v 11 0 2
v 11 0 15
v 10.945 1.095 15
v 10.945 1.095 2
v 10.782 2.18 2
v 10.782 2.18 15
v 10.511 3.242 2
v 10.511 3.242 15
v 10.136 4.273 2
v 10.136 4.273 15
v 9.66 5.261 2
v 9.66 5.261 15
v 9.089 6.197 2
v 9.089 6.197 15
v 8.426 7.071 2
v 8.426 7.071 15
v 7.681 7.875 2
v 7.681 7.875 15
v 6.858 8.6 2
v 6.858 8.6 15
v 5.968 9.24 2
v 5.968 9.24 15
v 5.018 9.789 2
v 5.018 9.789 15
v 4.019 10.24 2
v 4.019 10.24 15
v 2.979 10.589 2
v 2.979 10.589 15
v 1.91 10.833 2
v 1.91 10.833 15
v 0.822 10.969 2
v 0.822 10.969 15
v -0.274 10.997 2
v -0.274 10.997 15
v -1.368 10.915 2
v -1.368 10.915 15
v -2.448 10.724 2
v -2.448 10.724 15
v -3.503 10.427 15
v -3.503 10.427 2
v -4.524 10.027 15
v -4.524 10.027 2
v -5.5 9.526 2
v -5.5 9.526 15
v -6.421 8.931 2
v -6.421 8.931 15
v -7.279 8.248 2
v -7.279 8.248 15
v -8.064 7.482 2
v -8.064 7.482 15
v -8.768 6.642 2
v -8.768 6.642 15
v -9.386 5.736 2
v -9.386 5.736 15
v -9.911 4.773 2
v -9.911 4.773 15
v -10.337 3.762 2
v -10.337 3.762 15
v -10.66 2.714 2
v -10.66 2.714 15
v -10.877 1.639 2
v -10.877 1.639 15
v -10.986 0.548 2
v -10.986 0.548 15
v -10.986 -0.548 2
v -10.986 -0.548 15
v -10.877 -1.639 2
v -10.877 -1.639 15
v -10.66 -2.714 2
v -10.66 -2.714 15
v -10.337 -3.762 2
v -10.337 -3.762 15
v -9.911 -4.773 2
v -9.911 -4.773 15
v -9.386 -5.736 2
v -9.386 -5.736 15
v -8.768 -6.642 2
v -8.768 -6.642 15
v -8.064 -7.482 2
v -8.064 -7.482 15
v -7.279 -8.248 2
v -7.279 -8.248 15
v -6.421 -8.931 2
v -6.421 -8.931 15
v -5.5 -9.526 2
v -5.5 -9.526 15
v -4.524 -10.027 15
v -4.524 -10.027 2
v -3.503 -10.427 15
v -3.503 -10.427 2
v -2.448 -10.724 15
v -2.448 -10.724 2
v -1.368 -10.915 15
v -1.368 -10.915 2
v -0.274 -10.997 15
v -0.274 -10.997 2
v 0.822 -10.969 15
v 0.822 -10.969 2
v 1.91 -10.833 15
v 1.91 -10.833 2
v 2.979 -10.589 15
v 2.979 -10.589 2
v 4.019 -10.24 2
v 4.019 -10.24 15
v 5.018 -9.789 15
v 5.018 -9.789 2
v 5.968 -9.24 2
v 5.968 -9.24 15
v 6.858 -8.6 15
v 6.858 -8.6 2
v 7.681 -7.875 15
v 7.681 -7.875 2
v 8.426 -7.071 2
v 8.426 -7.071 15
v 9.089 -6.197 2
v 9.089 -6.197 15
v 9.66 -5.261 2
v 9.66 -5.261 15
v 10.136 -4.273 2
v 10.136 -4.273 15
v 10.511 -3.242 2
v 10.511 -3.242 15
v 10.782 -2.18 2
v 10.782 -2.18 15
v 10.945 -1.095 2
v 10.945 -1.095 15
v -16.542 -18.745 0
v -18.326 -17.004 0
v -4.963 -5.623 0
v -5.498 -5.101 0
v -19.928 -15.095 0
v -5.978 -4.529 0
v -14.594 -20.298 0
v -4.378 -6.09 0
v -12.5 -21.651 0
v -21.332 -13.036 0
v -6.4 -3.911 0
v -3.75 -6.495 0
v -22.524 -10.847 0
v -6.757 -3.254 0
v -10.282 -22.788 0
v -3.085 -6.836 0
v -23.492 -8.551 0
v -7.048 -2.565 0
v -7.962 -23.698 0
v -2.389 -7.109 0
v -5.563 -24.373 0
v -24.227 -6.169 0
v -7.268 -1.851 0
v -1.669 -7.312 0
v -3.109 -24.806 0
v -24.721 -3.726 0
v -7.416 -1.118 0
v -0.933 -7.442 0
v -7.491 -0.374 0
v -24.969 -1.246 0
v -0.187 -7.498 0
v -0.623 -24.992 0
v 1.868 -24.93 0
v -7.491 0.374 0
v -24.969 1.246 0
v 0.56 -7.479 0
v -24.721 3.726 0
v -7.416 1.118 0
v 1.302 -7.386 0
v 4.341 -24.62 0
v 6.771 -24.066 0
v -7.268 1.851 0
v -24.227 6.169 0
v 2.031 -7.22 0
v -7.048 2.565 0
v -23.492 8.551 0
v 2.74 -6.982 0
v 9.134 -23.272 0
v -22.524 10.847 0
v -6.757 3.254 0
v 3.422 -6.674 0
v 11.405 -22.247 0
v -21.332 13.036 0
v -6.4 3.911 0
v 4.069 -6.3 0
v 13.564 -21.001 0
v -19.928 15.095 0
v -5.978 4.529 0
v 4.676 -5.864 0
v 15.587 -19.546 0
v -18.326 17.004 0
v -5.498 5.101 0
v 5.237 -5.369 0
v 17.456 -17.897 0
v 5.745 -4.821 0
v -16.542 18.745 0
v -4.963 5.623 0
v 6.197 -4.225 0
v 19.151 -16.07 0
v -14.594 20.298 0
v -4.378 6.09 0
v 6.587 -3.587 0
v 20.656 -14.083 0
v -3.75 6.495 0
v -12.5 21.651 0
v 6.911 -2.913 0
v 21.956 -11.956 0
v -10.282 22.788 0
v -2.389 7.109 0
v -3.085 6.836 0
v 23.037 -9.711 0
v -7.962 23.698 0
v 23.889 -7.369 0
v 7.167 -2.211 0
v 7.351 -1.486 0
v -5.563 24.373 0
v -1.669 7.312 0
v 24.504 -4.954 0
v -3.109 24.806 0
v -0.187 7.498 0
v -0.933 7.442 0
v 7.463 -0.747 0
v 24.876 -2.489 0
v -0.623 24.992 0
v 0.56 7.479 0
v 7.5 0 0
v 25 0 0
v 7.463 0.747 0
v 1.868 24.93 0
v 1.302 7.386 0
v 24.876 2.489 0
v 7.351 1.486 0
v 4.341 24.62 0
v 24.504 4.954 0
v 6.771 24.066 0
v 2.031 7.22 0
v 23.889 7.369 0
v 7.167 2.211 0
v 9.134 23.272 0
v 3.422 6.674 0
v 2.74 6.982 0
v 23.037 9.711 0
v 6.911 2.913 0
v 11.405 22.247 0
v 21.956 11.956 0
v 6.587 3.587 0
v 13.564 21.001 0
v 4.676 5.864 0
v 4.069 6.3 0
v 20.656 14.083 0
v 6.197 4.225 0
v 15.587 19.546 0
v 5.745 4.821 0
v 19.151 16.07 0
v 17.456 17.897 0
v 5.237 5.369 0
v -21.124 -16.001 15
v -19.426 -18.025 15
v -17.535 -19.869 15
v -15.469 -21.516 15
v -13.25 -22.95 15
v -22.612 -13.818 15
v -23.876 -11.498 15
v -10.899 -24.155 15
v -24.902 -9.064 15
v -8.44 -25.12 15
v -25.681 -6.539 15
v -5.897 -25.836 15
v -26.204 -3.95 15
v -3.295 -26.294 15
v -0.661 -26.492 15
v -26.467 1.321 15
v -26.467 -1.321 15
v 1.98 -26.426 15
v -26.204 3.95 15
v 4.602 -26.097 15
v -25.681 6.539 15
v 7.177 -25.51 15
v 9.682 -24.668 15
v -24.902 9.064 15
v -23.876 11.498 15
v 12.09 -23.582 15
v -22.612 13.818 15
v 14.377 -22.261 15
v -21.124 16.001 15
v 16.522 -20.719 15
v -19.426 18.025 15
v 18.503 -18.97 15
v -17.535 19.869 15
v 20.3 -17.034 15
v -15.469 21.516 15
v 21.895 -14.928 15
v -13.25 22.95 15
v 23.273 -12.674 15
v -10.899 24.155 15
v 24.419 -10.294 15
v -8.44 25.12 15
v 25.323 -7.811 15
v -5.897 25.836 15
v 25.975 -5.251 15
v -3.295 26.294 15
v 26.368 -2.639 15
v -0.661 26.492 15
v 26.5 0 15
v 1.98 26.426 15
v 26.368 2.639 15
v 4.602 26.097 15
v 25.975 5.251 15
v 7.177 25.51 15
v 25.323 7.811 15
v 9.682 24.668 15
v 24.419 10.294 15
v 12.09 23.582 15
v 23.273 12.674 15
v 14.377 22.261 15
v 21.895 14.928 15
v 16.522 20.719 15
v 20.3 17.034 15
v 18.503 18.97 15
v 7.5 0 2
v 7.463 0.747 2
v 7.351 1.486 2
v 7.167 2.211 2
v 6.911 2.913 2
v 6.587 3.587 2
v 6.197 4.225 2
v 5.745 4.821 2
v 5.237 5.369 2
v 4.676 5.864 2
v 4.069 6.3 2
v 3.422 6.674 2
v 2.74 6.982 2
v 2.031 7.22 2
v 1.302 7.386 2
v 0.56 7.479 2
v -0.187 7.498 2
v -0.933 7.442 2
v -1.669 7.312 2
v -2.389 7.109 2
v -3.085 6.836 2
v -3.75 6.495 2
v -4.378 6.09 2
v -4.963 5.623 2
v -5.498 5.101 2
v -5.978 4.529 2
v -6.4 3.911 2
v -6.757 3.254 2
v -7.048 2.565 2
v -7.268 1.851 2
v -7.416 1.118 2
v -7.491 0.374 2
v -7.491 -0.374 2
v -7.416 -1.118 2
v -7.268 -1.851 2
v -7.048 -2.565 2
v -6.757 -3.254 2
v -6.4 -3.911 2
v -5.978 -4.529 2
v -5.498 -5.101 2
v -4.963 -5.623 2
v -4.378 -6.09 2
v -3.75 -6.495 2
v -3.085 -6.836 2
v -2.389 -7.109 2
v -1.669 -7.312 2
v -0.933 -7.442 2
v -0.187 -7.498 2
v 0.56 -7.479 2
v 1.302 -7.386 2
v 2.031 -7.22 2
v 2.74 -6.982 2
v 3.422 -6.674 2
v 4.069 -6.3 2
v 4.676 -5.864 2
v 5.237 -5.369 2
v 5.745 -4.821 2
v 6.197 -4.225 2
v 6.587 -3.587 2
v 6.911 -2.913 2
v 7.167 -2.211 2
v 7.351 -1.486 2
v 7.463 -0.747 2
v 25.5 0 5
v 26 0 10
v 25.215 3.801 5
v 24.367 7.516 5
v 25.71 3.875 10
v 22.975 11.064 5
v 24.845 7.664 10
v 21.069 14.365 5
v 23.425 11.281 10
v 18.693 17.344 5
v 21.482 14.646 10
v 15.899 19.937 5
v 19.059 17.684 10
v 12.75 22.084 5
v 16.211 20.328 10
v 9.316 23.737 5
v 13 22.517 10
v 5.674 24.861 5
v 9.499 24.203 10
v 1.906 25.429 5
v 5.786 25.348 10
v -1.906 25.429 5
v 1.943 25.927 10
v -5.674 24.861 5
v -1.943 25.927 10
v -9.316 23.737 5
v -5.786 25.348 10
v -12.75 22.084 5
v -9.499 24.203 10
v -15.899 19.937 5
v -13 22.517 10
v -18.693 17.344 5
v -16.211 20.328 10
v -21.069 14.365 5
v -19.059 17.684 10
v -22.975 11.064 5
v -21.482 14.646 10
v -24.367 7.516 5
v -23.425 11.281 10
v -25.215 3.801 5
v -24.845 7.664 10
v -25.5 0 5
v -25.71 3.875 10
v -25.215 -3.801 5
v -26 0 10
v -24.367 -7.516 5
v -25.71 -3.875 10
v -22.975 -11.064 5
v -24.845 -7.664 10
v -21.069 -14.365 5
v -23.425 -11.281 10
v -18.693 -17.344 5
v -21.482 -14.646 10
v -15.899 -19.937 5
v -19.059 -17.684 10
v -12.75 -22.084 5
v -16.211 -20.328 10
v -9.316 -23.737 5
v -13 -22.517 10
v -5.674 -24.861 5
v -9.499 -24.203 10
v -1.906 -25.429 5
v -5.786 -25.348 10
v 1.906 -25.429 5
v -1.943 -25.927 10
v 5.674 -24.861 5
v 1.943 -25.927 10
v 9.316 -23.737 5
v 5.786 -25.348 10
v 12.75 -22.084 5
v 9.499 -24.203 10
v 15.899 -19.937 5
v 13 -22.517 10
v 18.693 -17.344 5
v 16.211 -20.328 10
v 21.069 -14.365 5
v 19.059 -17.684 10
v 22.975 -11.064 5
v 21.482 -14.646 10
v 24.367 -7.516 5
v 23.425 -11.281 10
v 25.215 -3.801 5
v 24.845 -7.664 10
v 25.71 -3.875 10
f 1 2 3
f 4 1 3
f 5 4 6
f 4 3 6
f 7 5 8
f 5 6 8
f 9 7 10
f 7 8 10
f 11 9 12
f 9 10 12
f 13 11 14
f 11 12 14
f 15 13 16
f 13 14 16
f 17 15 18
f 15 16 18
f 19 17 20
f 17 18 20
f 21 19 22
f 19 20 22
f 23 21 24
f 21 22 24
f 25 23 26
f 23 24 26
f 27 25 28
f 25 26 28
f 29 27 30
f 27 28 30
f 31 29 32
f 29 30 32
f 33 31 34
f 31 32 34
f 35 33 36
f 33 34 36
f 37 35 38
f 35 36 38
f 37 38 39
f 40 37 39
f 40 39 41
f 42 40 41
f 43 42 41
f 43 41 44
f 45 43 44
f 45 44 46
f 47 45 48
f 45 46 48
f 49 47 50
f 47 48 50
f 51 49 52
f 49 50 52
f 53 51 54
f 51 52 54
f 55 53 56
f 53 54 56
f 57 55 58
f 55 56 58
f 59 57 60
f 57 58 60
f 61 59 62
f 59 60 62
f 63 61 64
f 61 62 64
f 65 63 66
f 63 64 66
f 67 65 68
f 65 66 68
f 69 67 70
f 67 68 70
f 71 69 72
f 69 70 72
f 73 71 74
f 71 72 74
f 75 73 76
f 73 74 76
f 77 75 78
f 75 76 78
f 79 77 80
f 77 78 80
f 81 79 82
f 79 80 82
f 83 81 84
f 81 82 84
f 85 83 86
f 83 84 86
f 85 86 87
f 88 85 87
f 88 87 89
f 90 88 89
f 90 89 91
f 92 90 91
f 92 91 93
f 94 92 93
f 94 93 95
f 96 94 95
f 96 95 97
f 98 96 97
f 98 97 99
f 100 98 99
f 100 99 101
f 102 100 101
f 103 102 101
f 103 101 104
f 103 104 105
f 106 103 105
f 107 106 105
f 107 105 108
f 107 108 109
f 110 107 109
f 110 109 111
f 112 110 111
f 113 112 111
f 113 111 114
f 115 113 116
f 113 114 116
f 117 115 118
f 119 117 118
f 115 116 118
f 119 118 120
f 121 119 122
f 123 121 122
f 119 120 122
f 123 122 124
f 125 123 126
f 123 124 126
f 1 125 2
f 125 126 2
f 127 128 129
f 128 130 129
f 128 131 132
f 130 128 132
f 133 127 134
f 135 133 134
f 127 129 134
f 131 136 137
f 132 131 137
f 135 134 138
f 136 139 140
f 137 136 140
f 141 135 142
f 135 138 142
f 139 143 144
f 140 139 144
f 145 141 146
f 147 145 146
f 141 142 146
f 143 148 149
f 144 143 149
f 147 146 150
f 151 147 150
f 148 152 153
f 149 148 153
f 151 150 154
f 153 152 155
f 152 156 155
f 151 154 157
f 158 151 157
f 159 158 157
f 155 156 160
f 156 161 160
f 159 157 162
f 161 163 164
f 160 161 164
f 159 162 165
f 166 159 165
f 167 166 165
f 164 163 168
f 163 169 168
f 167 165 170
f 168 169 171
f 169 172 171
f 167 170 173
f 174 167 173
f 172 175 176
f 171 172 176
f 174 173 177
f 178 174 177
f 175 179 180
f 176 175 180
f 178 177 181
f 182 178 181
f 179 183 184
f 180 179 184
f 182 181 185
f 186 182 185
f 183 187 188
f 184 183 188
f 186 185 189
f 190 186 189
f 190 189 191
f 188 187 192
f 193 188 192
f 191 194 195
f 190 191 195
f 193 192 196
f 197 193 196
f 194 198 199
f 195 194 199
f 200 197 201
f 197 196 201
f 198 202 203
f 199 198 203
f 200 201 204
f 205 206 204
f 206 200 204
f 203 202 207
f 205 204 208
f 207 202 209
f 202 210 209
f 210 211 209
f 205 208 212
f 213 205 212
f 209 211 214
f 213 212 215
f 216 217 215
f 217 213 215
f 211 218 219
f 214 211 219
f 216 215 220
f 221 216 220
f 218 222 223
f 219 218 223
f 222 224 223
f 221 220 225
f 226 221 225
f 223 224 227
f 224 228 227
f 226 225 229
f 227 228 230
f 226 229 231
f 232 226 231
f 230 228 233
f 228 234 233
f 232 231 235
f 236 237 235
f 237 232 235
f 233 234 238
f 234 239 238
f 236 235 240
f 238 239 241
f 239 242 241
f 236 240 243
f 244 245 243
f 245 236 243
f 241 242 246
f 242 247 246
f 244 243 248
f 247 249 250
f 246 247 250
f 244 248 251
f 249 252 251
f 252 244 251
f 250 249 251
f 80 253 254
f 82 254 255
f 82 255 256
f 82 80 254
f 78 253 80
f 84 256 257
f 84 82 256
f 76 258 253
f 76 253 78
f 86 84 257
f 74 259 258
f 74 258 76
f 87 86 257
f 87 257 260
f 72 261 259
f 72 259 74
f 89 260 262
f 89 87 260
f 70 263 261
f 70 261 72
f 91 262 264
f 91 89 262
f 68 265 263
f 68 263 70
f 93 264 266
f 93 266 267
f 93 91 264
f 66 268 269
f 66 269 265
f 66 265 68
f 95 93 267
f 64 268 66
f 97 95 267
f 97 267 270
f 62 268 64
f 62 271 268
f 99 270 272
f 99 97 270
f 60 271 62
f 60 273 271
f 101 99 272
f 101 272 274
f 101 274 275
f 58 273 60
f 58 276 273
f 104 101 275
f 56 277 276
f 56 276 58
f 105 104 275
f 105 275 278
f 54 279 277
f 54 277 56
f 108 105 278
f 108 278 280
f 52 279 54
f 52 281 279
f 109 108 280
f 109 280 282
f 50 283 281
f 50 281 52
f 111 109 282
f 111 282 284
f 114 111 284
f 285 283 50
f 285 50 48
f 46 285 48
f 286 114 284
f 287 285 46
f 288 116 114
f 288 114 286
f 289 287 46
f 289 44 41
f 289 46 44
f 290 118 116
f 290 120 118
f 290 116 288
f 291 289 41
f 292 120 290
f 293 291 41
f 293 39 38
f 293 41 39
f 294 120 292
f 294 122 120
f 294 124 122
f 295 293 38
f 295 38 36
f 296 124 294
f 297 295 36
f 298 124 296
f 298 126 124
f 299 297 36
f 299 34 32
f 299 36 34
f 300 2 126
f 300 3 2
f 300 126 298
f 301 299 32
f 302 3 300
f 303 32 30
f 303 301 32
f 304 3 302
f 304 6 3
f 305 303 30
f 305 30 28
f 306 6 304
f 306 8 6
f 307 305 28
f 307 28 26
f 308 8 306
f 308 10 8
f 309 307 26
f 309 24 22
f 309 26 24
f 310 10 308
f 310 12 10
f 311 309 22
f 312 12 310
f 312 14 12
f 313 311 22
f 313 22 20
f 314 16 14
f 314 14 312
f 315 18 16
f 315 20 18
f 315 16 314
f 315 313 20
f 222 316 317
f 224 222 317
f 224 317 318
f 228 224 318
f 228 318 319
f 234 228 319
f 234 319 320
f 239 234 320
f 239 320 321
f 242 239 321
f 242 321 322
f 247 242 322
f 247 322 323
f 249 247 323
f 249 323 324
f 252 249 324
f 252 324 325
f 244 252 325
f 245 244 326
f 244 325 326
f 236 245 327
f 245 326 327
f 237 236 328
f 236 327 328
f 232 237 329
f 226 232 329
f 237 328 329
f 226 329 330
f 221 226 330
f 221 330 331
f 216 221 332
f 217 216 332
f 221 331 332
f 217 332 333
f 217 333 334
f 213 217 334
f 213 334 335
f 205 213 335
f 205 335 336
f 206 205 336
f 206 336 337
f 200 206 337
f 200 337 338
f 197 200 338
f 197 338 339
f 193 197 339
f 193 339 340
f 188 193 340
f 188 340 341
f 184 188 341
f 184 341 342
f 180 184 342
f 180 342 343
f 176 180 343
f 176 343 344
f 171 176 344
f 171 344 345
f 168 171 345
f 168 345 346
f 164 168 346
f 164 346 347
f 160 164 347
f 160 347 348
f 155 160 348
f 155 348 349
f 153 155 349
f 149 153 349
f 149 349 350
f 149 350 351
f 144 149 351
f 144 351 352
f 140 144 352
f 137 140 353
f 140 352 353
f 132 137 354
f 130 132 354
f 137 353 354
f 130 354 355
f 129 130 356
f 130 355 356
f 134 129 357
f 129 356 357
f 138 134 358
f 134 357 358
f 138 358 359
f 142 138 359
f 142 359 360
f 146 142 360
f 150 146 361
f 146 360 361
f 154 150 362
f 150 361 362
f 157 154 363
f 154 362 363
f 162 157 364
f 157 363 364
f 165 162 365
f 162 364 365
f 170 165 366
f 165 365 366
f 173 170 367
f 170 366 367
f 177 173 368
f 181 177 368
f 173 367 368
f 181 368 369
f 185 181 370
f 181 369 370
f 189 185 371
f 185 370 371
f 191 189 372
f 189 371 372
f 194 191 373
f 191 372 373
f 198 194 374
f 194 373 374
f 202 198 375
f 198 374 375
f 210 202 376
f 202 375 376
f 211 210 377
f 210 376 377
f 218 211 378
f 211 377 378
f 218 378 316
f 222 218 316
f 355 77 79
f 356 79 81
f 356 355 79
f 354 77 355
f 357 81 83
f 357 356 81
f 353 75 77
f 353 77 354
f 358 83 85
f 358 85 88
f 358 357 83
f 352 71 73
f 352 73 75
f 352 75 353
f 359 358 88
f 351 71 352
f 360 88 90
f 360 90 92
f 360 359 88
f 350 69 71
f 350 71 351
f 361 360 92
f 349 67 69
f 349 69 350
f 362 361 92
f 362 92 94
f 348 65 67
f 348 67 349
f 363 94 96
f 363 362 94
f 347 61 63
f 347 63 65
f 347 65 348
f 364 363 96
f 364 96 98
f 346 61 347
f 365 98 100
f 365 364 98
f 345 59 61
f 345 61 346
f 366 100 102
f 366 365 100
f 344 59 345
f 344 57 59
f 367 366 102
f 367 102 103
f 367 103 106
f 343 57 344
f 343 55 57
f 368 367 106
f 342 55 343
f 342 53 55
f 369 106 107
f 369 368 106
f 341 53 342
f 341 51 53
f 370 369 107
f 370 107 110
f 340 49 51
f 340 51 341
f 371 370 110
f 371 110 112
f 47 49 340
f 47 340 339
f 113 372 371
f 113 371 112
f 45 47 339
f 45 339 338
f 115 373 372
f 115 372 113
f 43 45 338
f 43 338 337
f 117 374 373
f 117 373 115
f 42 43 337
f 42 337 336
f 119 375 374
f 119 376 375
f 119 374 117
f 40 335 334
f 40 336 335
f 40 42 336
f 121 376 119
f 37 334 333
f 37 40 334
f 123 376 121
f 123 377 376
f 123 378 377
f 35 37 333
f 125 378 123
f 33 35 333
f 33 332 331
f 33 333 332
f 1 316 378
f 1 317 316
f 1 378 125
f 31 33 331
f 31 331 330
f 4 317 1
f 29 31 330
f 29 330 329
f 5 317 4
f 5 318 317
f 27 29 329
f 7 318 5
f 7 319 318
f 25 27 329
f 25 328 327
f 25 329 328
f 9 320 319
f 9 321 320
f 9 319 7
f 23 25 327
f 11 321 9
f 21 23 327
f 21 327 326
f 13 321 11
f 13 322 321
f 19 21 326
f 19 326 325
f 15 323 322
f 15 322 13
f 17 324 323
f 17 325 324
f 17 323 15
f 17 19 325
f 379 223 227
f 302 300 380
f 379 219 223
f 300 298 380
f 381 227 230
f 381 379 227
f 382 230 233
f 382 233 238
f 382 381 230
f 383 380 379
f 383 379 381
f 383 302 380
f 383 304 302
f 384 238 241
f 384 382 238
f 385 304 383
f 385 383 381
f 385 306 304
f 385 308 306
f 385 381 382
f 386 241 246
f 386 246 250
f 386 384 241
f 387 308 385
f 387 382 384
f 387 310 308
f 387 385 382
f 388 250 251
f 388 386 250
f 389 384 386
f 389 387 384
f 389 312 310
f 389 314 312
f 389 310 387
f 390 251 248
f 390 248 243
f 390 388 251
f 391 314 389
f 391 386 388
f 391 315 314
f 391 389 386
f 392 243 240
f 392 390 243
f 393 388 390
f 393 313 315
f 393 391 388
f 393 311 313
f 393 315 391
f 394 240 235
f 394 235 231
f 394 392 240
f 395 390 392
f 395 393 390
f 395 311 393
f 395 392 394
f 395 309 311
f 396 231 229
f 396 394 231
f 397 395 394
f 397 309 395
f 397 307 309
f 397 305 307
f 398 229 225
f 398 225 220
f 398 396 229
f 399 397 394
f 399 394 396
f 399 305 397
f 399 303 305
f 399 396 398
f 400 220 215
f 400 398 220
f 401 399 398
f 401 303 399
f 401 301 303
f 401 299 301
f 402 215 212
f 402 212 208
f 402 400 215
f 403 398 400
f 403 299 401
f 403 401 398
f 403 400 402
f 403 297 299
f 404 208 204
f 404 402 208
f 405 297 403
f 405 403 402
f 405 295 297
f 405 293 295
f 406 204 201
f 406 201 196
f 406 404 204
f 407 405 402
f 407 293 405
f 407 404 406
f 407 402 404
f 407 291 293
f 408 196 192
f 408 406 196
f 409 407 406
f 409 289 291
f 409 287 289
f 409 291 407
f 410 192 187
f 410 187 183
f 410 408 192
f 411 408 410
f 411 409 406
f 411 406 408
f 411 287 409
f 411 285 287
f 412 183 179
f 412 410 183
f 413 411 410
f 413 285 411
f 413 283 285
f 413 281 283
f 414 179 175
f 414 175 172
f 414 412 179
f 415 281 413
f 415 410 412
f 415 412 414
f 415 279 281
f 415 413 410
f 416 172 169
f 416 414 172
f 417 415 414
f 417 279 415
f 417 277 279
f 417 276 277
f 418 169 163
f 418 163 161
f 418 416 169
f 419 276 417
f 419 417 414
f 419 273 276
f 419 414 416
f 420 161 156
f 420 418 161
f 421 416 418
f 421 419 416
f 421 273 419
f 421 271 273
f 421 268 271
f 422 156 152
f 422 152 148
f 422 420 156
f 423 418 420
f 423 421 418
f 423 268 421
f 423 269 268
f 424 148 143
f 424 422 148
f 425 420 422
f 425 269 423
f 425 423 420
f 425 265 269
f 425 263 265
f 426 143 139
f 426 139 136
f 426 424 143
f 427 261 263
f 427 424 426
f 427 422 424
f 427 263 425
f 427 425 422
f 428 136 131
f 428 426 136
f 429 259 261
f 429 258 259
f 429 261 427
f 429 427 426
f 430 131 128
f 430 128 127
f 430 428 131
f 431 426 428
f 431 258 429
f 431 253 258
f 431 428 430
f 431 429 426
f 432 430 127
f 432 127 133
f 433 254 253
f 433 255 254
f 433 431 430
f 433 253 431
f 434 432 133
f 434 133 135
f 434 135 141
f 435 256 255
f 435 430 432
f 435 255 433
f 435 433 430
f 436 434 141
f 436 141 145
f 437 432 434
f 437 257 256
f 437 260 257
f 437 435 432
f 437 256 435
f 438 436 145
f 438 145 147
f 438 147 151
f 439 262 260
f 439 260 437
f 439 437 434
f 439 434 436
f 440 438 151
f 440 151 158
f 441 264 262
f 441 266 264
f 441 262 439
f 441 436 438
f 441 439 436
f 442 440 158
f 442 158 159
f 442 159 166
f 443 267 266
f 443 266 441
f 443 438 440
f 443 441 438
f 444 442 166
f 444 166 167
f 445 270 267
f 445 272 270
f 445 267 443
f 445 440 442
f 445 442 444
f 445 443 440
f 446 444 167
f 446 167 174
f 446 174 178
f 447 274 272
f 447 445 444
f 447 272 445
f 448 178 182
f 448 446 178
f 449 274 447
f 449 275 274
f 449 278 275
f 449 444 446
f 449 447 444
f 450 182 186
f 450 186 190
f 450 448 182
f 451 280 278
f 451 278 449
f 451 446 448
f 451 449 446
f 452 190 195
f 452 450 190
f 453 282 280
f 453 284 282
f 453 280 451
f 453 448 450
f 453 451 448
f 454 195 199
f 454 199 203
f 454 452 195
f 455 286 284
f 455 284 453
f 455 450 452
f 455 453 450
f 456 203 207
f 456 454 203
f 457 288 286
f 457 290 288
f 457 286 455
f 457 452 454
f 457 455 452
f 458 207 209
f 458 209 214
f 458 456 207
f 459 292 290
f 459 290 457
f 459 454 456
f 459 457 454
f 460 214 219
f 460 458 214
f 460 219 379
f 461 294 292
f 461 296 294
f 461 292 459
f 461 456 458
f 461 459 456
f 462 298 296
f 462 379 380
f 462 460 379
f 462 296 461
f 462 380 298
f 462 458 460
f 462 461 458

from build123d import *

# Parameters (mm, degrees)
F0_R     = 25
F2_R     = 26.5
F4_R     = 11
F5_DEPTH = 13
F6_R     = 7.5
F7_DEPTH = 25


with BuildPart() as f3:
    # F0 (on Top) → F3 section 0
    with BuildSketch(Plane.XY):
        Circle(F0_R)
    # F2 (on offset) → F3 section 1
    with BuildSketch(Plane.XY.offset(15)):
        Circle(F2_R)
    loft()

    # F4 (on face) → F5 (cut)
    with BuildSketch(Plane.XY.offset(15)):
        Circle(F4_R)
    extrude(amount=-F5_DEPTH, mode=Mode.SUBTRACT)

    # F6 (on face) → F7 (cut)
    with BuildSketch(Plane.XY.offset(2)):
        Circle(F6_R)
    extrude(amount=-F7_DEPTH, mode=Mode.SUBTRACT)


solid = f3.part
